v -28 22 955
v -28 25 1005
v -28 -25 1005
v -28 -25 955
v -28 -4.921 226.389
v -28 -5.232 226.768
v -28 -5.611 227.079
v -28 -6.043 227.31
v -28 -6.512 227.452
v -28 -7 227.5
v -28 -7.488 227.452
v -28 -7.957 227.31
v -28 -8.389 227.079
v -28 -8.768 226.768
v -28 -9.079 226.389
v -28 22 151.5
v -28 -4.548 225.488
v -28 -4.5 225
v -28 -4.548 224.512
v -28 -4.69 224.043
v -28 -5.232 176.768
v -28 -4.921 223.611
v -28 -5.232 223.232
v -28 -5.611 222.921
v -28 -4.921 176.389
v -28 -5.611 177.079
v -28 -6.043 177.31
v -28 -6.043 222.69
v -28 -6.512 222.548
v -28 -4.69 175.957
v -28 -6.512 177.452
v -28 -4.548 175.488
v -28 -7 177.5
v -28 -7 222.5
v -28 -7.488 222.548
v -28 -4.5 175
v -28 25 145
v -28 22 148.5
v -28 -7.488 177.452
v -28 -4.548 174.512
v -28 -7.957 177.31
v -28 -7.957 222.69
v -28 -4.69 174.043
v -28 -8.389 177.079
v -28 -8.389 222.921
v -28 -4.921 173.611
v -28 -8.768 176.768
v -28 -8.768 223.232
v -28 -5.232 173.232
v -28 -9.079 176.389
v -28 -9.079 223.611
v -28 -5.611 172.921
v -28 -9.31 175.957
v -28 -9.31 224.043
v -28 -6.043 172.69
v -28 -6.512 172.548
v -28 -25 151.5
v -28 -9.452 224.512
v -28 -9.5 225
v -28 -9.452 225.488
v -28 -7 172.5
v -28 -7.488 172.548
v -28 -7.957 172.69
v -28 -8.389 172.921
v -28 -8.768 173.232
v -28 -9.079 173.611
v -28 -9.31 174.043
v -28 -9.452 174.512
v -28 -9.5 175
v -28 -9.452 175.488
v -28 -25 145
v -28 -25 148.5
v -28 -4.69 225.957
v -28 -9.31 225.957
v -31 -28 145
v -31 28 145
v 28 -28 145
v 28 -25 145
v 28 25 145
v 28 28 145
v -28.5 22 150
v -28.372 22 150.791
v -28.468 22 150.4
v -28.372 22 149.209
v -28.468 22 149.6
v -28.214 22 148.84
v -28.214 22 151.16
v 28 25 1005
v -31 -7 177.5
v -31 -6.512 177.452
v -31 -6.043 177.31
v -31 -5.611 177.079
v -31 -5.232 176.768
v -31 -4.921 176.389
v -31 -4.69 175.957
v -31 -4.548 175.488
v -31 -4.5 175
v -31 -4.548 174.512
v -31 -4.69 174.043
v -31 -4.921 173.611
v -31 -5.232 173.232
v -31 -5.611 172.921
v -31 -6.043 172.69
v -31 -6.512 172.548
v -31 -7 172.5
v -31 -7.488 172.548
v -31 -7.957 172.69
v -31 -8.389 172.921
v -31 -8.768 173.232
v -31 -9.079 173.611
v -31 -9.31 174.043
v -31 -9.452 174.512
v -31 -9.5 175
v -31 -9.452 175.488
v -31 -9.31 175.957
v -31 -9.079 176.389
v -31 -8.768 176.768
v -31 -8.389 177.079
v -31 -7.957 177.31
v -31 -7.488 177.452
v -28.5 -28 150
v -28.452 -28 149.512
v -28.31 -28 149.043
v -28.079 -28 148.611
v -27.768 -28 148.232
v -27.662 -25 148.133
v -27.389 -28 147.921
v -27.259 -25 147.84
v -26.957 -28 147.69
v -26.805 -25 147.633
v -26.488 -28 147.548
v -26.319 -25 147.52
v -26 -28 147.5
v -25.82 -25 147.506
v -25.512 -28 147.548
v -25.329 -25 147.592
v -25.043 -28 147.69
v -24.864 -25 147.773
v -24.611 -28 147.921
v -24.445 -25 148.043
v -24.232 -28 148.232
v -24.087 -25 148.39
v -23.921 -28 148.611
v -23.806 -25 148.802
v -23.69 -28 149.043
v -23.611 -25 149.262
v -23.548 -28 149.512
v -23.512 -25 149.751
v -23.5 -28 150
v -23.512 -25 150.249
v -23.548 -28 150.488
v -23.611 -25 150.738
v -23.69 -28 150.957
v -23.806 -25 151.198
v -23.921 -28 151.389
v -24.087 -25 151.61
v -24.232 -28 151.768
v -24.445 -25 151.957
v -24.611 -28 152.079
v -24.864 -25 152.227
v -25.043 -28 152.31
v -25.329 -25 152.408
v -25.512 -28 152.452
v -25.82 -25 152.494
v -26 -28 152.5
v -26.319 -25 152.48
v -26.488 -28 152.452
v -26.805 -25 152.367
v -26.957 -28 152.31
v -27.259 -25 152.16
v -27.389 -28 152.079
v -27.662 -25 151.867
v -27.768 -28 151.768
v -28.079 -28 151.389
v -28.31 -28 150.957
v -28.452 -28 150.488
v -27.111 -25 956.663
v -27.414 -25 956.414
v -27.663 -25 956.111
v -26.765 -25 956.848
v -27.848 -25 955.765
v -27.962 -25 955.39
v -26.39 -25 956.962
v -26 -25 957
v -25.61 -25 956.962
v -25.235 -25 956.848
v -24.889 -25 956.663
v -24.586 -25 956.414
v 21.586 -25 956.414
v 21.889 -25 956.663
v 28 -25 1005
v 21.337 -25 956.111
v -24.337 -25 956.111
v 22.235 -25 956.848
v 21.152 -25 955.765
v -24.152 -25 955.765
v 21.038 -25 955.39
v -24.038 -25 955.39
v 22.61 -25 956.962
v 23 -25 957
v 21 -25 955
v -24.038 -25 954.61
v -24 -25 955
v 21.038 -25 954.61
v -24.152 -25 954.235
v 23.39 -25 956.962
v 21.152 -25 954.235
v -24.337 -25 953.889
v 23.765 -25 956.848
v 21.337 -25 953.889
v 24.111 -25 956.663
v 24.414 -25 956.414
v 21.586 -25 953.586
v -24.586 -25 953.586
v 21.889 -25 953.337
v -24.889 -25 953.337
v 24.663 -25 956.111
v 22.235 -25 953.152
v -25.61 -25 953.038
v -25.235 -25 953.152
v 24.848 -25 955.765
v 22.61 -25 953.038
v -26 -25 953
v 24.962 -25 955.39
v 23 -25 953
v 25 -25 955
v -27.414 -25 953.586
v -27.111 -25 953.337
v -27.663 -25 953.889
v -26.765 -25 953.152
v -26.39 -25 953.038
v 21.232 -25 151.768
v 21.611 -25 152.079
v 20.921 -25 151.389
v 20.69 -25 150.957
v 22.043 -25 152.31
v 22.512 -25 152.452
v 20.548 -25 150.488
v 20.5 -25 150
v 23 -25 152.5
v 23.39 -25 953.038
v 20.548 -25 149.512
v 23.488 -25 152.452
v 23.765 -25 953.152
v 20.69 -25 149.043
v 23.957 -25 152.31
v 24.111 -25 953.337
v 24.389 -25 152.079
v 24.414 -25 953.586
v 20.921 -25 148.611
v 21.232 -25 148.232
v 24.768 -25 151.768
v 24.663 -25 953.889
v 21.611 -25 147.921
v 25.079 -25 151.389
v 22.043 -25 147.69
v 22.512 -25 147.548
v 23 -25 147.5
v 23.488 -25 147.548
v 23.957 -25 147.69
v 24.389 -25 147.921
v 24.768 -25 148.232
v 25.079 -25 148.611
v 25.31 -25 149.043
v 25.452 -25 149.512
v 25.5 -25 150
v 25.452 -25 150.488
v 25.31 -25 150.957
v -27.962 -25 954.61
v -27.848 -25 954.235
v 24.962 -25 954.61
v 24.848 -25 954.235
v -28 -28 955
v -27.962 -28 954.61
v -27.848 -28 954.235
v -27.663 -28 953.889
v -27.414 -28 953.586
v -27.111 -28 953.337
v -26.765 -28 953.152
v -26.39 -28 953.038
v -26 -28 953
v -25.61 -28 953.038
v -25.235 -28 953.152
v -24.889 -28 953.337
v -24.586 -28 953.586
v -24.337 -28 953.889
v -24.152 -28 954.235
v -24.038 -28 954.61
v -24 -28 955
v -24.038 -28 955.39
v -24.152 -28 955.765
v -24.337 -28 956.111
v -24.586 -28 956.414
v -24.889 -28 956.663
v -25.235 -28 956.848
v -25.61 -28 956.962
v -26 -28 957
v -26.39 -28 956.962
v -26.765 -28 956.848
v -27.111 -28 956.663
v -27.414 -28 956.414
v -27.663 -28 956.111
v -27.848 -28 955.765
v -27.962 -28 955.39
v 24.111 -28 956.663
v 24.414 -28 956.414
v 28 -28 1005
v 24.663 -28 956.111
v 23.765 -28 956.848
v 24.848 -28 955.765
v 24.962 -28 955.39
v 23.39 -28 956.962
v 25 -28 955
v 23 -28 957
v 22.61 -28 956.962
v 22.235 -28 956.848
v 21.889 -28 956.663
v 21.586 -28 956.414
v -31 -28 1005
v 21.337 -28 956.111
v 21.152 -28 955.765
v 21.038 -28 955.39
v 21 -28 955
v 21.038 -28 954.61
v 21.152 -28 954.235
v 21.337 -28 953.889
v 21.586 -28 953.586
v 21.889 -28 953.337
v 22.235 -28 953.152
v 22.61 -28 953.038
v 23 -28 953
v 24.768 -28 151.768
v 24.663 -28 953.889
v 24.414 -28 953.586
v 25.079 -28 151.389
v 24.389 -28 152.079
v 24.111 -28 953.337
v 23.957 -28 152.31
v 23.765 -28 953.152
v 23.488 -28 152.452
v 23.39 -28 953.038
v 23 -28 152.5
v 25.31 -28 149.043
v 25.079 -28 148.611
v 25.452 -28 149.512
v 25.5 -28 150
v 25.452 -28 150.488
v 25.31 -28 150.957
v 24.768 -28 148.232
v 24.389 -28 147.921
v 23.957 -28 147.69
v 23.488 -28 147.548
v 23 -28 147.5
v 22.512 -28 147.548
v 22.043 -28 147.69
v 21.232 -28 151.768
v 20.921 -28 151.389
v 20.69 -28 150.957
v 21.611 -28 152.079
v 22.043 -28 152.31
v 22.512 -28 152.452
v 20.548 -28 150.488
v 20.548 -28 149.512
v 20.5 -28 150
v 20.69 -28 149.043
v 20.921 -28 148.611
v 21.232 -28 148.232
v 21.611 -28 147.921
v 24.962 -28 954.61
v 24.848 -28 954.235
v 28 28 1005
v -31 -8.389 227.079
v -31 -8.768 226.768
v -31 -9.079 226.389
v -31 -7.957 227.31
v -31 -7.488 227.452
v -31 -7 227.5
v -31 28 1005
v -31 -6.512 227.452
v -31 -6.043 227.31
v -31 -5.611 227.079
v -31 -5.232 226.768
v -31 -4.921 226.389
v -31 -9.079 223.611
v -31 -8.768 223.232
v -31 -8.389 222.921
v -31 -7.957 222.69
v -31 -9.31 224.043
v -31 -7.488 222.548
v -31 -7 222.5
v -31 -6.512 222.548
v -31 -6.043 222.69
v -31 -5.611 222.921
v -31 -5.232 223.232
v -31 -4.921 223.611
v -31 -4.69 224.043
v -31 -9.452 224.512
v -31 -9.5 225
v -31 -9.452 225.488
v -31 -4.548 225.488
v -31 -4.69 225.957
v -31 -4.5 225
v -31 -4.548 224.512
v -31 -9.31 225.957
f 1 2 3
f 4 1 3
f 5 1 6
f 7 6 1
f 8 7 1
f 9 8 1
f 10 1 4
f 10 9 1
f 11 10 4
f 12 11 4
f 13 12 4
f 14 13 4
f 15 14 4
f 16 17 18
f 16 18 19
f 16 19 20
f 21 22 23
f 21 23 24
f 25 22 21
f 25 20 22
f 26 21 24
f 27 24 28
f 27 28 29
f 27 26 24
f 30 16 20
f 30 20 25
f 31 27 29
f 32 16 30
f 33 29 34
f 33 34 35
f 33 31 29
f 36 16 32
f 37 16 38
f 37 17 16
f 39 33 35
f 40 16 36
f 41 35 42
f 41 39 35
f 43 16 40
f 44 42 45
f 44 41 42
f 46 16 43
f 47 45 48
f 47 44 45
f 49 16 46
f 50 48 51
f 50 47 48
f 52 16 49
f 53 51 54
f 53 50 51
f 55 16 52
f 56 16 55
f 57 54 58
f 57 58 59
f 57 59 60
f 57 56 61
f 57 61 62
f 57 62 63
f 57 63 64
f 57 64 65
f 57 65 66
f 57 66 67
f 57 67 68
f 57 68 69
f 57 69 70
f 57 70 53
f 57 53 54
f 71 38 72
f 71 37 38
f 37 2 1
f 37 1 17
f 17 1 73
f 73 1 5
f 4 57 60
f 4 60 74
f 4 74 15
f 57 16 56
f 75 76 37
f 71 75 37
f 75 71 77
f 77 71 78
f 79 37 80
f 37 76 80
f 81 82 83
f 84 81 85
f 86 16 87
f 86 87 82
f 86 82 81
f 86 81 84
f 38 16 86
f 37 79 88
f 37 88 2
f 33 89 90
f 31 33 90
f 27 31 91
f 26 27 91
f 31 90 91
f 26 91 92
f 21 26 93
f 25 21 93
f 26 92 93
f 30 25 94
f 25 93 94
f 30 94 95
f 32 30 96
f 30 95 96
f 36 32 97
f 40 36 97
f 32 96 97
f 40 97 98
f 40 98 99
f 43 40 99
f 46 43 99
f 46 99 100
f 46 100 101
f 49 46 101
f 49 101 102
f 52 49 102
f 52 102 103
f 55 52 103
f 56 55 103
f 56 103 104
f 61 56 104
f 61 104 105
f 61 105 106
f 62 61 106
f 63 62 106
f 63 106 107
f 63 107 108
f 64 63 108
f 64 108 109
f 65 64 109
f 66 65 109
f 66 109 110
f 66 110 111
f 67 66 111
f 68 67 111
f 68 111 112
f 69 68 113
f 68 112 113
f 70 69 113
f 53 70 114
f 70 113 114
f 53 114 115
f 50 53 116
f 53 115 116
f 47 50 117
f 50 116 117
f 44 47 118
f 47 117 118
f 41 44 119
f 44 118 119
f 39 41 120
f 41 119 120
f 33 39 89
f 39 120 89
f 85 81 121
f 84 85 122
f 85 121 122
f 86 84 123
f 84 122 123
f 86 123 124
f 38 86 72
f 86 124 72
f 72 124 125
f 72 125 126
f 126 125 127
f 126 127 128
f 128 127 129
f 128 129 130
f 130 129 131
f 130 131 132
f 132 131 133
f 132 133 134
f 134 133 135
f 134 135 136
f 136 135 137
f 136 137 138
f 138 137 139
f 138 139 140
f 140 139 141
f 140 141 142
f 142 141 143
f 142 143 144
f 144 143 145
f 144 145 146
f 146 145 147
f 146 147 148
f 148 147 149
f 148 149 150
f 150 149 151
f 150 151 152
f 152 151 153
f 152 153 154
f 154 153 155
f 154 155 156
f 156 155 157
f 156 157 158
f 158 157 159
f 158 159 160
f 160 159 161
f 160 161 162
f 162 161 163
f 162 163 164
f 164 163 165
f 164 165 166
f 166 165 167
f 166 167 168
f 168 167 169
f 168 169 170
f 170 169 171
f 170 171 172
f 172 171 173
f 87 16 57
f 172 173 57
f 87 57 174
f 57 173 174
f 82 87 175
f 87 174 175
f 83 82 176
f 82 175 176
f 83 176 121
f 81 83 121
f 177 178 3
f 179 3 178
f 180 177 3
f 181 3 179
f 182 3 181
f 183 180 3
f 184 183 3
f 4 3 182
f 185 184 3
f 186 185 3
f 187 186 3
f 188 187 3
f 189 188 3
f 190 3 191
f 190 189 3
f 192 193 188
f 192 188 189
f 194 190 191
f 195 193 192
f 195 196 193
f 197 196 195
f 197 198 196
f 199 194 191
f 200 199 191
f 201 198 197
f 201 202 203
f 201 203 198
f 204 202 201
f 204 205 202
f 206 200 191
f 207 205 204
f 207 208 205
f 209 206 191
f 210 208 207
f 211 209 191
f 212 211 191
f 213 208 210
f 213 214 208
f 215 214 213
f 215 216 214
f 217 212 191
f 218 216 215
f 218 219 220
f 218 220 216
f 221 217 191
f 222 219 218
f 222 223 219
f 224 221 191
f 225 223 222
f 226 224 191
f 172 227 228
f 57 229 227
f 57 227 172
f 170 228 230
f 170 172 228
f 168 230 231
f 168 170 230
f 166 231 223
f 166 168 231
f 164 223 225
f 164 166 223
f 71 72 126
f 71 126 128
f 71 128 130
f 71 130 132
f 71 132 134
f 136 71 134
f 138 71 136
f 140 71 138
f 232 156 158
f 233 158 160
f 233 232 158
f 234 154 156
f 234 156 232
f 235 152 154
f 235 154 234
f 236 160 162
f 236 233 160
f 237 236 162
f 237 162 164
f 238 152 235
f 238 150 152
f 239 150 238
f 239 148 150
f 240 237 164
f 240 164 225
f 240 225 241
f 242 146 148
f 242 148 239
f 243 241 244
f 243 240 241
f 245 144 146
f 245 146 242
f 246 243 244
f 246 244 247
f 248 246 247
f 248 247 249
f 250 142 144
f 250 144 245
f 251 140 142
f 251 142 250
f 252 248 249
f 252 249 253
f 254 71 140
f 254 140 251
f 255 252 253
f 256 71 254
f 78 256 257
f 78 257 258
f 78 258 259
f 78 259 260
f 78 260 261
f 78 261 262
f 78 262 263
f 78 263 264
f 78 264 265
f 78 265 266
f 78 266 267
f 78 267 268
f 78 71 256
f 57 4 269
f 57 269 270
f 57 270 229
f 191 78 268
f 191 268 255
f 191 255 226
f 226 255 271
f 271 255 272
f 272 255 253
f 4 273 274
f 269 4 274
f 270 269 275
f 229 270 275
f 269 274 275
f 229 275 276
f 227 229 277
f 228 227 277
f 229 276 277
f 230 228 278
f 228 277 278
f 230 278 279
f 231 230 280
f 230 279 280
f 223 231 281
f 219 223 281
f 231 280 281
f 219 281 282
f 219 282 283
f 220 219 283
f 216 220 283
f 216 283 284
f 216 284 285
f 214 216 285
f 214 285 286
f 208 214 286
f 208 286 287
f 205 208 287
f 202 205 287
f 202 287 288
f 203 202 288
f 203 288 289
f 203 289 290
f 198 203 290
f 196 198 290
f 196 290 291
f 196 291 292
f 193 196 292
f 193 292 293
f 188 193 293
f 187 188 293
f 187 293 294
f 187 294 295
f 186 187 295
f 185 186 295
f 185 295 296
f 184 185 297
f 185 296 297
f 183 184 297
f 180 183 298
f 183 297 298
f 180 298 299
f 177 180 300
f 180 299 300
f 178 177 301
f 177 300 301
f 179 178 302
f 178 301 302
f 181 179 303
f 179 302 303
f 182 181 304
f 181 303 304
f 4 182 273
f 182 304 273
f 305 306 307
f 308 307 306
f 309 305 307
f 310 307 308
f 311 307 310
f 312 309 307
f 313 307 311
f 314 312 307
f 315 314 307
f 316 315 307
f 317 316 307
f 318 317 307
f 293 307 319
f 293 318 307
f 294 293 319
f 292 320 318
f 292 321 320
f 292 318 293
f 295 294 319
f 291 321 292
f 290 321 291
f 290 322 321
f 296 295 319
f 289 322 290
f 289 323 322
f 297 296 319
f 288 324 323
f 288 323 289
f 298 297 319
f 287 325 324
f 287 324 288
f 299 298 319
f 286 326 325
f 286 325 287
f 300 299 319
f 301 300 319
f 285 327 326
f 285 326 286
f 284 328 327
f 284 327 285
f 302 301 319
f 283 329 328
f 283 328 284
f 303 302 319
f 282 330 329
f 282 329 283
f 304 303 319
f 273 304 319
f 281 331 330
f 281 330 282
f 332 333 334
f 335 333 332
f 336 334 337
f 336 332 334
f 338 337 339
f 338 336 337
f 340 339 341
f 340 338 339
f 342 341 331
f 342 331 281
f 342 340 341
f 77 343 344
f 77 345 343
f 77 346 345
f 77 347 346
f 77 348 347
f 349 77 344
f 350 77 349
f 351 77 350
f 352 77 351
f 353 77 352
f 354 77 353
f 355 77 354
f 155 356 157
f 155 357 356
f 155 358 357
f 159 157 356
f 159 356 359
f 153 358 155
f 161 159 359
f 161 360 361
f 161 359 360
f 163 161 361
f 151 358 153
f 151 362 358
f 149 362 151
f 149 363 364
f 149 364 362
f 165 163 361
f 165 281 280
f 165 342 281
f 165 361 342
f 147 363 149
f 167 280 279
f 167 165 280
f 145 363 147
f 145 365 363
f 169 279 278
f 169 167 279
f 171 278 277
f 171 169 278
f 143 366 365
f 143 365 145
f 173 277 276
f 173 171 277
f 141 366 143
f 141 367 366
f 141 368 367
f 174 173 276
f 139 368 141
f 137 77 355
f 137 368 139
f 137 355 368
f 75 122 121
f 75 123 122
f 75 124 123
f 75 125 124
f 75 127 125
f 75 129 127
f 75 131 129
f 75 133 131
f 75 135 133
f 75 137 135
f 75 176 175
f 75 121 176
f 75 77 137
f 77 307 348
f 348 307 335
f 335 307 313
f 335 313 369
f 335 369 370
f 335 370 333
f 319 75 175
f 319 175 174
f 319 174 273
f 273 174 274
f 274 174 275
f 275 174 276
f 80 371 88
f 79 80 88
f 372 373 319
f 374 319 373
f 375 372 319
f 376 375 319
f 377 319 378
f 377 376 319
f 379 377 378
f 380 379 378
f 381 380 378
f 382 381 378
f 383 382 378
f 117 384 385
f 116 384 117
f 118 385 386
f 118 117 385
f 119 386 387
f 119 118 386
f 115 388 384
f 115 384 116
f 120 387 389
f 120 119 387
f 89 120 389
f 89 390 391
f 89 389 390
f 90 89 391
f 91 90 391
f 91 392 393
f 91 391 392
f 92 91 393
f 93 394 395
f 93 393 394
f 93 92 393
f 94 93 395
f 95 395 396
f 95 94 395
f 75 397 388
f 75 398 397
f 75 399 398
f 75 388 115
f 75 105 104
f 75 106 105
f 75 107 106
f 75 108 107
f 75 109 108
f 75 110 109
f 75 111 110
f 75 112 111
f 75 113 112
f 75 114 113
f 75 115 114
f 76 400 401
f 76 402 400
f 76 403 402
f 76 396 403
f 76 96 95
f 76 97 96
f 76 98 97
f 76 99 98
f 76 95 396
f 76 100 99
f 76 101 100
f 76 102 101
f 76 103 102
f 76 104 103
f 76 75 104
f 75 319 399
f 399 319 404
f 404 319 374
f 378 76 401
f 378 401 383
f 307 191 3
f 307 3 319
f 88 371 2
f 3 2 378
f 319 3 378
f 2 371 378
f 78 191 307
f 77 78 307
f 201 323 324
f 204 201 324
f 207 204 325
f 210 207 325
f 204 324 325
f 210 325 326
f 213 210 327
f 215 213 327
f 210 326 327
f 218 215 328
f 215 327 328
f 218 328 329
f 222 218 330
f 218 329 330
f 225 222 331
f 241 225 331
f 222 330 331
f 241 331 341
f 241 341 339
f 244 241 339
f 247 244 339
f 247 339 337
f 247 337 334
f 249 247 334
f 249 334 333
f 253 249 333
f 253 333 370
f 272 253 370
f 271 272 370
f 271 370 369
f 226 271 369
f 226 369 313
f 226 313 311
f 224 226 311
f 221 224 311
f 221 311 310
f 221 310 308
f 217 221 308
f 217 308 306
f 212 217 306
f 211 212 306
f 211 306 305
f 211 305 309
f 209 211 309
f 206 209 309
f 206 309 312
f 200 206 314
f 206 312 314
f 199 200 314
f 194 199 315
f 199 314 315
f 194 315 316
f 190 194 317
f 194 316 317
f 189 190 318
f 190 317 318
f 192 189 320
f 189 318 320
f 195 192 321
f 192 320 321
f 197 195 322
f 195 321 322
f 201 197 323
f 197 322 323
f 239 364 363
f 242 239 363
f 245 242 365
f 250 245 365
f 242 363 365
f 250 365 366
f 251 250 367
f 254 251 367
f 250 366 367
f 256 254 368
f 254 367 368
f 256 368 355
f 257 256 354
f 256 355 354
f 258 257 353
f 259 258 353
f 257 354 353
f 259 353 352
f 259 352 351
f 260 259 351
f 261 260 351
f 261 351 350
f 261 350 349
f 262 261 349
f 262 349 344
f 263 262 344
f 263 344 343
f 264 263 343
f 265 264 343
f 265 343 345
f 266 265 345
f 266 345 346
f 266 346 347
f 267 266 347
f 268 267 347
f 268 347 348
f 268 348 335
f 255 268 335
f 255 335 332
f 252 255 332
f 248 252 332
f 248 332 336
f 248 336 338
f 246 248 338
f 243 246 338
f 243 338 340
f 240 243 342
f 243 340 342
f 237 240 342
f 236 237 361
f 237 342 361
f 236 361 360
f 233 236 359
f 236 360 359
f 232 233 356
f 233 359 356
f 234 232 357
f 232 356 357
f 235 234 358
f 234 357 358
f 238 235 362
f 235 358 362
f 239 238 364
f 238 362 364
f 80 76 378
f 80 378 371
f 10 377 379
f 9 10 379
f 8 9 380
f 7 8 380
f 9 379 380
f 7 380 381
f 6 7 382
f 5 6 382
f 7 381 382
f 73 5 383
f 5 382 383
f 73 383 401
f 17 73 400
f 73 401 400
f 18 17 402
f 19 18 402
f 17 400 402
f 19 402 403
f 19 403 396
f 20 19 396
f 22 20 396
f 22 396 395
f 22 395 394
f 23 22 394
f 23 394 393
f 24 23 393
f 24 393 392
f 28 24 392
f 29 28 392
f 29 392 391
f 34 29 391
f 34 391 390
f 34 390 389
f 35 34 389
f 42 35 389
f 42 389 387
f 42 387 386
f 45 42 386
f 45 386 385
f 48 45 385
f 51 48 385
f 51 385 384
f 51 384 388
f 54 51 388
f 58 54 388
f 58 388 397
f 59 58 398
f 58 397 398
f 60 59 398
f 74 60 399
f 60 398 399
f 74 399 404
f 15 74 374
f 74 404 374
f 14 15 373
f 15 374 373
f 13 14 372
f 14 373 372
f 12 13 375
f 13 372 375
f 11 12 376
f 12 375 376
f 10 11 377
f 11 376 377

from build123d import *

# Parameters (mm, degrees)
ESTRUSIONE_ESTRUSIONE1_DEPTH = 1005
SCHIZZO2_R                   = 2
TAGLIO_ESTRUSIONE1_DEPTH     = 50
SCHIZZO3_R                   = 2.5
TAGLIO_ESTRUSIONE2_DEPTH     = 50
SCHIZZO4_W                   = 59
SCHIZZO4_H                   = 145
TAGLIO_ESTRUSIONE3_DEPTH     = 63
SCHIZZO8_R                   = 2.5
TAGLIO_ESTRUSIONE5_DEPTH     = 10


with BuildPart() as part:
    # Schizzo1 → Estrusione-Estrusione1 (new body)
    with BuildSketch(Plane.XY):
        Polygon((28, -25), (28, -28), (-31, -28), (-31, 28), (28, 28), (28, 25), (-28, 25), (-28, -25), align=None)
    extrude(amount=ESTRUSIONE_ESTRUSIONE1_DEPTH)

    # Schizzo2 → Taglio-Estrusione1 (cut)
    with BuildSketch(Plane(origin=(0, -28, 0), x_dir=(-1, 0, 0), z_dir=(0, -1, 0))):
        with Locations((-23, -955)):
            Circle(SCHIZZO2_R)
        with Locations((26, -955)):
            Circle(SCHIZZO2_R)
    extrude(amount=-TAGLIO_ESTRUSIONE1_DEPTH, mode=Mode.SUBTRACT)

    # Schizzo3 → Taglio-Estrusione2 (cut)
    with BuildSketch(Plane(origin=(0, -28, 0), x_dir=(-1, 0, 0), z_dir=(0, -1, 0))):
        with Locations((26, -150)):
            Circle(SCHIZZO3_R)
        with Locations((-23, -150)):
            Circle(SCHIZZO3_R)
    extrude(amount=-TAGLIO_ESTRUSIONE2_DEPTH, mode=Mode.SUBTRACT)

    # Schizzo4 → Taglio-Estrusione3 (cut)
    with BuildSketch(Plane(origin=(0, 28, 0), x_dir=(1, 0, 0), z_dir=(0, 1, 0))):
        with Locations((-1.5, -72.5)):
            Rectangle(SCHIZZO4_W, SCHIZZO4_H)
    extrude(amount=-TAGLIO_ESTRUSIONE3_DEPTH, mode=Mode.SUBTRACT)

    # Schizzo8 → Taglio-Estrusione5 (cut)
    with BuildSketch(Plane.ZY.offset(31)):
        with Locations((175, -7)):
            Circle(SCHIZZO8_R)
        with Locations((225, -7)):
            Circle(SCHIZZO8_R)
    extrude(amount=-TAGLIO_ESTRUSIONE5_DEPTH, mode=Mode.SUBTRACT)


solid = part.part
